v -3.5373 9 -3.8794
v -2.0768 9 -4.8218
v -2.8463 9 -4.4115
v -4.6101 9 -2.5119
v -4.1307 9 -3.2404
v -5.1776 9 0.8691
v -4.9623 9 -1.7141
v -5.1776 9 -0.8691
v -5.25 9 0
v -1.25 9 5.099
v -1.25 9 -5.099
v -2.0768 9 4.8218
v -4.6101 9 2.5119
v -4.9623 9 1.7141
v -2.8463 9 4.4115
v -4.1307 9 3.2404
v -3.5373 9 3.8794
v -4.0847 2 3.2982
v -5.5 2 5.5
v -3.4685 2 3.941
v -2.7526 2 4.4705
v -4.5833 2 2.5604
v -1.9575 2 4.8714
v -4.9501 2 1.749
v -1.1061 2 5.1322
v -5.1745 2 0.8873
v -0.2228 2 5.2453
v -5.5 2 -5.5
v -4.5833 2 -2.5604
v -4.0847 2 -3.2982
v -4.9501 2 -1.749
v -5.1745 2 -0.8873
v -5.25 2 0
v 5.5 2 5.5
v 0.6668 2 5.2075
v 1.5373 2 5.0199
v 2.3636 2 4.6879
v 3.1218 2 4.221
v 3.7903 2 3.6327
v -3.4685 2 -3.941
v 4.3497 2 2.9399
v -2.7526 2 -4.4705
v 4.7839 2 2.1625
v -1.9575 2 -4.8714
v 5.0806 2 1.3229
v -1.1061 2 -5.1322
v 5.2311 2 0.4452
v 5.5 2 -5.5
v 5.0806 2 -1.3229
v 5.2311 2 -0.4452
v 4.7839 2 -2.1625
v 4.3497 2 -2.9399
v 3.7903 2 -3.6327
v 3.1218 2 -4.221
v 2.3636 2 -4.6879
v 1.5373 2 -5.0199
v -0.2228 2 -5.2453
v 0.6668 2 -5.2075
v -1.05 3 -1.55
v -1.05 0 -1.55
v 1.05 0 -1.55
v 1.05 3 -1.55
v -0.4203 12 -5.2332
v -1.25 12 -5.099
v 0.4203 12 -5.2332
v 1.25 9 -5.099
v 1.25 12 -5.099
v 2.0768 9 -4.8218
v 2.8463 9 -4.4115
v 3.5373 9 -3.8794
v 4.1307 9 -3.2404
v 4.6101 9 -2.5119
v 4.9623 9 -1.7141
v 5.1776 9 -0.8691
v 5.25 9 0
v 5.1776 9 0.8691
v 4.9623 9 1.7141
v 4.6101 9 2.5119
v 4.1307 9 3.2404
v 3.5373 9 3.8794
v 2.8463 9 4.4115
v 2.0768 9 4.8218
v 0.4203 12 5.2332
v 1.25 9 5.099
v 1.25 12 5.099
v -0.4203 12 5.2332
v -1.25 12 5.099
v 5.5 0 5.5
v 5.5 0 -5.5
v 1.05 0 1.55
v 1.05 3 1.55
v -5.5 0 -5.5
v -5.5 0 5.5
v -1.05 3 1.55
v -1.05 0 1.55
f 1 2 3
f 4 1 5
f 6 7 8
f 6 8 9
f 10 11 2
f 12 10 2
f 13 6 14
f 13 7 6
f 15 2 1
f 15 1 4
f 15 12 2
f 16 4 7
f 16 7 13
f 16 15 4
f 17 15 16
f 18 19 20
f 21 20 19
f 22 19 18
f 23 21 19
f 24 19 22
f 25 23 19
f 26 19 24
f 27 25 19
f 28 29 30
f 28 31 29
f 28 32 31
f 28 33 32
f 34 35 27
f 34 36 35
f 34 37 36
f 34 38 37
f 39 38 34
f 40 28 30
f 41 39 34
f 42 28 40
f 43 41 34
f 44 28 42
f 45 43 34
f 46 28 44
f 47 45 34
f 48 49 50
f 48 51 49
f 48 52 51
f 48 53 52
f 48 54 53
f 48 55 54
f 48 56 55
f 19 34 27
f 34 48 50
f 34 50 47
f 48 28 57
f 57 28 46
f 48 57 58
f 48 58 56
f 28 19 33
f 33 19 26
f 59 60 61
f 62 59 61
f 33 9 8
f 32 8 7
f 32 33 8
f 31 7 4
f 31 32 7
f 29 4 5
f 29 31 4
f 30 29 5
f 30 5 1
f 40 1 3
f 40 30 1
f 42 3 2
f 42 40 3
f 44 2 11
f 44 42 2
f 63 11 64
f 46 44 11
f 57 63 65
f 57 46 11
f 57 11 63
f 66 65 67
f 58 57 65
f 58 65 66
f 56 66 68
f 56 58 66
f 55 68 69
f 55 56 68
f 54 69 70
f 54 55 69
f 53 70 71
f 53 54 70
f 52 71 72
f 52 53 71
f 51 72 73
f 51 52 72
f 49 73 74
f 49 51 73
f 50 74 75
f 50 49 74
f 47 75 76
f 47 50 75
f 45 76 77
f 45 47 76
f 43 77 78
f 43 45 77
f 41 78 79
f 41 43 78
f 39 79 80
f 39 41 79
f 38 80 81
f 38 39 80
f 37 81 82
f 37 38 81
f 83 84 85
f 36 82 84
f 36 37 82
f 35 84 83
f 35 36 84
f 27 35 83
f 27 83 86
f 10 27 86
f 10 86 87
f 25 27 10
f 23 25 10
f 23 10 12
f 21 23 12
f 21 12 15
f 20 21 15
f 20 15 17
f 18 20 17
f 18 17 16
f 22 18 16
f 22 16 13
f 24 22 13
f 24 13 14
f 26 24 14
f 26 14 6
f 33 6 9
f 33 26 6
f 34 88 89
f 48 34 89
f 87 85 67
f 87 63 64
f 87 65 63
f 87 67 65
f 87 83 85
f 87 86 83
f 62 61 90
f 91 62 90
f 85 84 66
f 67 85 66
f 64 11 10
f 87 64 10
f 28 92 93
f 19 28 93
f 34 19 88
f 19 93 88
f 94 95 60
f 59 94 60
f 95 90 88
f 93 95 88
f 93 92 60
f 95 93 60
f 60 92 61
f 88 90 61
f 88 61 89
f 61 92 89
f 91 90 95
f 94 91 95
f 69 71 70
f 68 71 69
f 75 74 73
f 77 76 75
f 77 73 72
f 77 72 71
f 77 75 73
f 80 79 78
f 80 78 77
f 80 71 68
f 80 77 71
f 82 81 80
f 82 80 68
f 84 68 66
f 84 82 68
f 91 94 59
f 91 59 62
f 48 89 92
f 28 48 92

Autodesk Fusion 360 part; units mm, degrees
sketch "Sketch1" plane through (0, 0, 0) normal (0, 1, 0) x (1, 0, 0)
  line L0 (5.5, 5.5) -> (-5.5, 5.5)
  line L1 (-5.5, 5.5) -> (-5.5, -5.5)
  line L2 (-5.5, -5.5) -> (5.5, -5.5)
  line L3 (5.5, -5.5) -> (5.5, 5.5)
  line L4 (5.5, 5.5) -> (-5.5, -5.5) construction
  line L5 (-5.5, 5.5) -> (5.5, -5.5) construction
  dimension "d1" = 11
  dimension "d2" = 11
extrude "Extrude1" add sketch "Sketch1" along normal blind 2
sketch "Sketch2" plane through (0, 2, 0) normal (0, 1, 0) x (-1, 0, 0)
  line L0 (-5.5, 5.5) -> (-5.5, -5.5)
  line L1 (-5.5, -5.5) -> (5.5, -5.5)
  line L2 (5.5, -5.5) -> (5.5, 5.5)
  line L3 (5.5, 5.5) -> (-5.5, 5.5)
  circle A0 centre (0, 0) radius 5.25
  dimension "d5" = 10.5
extrude "Extrude2" add sketch "Sketch2" along normal blind 7 contours A0
sketch "Sketch3" plane through (0, 9, 0) normal (0, 1, 0) x (-1, 0, 0)
  circle A0 centre (0, 0) radius 5.25
  line L0 (1.25, 5.25) -> (-1.25, 5.25)
  line L1 (-1.25, 5.25) -> (-1.25, -5.25)
  line L2 (-1.25, -5.25) -> (1.25, -5.25)
  line L3 (1.25, -5.25) -> (1.25, 5.25)
  line L4 (1.25, 5.25) -> (-1.25, -5.25) construction
  line L5 (-1.25, 5.25) -> (1.25, -5.25) construction
  dimension "d8" = 2.5
  dimension "d9" = 10.5
extrude "Extrude3" add sketch "Sketch3" along normal blind 3 contours A0 L1 L3
sketch "Sketch4" plane through (0, 0, 0) normal (0, -1, 0) x (1, 0, 0)
  line L0 (5.5, -5.5) -> (5.5, 5.5)
  line L1 (5.5, 5.5) -> (-5.5, 5.5)
  line L2 (-5.5, 5.5) -> (-5.5, -5.5)
  line L3 (-5.5, -5.5) -> (5.5, -5.5)
  line L4 (1.05, 1.55) -> (-1.05, 1.55)
  line L5 (-1.05, 1.55) -> (-1.05, -1.55)
  line L6 (-1.05, -1.55) -> (1.05, -1.55)
  line L7 (1.05, -1.55) -> (1.05, 1.55)
  line L8 (1.05, 1.55) -> (-1.05, -1.55) construction
  line L9 (-1.05, 1.55) -> (1.05, -1.55) construction
  dimension "d12" = 2.1
  dimension "d13" = 3.1
extrude "Extrude4" cut sketch "Sketch4" against normal blind 3 contours L4 L5 L6 L7
